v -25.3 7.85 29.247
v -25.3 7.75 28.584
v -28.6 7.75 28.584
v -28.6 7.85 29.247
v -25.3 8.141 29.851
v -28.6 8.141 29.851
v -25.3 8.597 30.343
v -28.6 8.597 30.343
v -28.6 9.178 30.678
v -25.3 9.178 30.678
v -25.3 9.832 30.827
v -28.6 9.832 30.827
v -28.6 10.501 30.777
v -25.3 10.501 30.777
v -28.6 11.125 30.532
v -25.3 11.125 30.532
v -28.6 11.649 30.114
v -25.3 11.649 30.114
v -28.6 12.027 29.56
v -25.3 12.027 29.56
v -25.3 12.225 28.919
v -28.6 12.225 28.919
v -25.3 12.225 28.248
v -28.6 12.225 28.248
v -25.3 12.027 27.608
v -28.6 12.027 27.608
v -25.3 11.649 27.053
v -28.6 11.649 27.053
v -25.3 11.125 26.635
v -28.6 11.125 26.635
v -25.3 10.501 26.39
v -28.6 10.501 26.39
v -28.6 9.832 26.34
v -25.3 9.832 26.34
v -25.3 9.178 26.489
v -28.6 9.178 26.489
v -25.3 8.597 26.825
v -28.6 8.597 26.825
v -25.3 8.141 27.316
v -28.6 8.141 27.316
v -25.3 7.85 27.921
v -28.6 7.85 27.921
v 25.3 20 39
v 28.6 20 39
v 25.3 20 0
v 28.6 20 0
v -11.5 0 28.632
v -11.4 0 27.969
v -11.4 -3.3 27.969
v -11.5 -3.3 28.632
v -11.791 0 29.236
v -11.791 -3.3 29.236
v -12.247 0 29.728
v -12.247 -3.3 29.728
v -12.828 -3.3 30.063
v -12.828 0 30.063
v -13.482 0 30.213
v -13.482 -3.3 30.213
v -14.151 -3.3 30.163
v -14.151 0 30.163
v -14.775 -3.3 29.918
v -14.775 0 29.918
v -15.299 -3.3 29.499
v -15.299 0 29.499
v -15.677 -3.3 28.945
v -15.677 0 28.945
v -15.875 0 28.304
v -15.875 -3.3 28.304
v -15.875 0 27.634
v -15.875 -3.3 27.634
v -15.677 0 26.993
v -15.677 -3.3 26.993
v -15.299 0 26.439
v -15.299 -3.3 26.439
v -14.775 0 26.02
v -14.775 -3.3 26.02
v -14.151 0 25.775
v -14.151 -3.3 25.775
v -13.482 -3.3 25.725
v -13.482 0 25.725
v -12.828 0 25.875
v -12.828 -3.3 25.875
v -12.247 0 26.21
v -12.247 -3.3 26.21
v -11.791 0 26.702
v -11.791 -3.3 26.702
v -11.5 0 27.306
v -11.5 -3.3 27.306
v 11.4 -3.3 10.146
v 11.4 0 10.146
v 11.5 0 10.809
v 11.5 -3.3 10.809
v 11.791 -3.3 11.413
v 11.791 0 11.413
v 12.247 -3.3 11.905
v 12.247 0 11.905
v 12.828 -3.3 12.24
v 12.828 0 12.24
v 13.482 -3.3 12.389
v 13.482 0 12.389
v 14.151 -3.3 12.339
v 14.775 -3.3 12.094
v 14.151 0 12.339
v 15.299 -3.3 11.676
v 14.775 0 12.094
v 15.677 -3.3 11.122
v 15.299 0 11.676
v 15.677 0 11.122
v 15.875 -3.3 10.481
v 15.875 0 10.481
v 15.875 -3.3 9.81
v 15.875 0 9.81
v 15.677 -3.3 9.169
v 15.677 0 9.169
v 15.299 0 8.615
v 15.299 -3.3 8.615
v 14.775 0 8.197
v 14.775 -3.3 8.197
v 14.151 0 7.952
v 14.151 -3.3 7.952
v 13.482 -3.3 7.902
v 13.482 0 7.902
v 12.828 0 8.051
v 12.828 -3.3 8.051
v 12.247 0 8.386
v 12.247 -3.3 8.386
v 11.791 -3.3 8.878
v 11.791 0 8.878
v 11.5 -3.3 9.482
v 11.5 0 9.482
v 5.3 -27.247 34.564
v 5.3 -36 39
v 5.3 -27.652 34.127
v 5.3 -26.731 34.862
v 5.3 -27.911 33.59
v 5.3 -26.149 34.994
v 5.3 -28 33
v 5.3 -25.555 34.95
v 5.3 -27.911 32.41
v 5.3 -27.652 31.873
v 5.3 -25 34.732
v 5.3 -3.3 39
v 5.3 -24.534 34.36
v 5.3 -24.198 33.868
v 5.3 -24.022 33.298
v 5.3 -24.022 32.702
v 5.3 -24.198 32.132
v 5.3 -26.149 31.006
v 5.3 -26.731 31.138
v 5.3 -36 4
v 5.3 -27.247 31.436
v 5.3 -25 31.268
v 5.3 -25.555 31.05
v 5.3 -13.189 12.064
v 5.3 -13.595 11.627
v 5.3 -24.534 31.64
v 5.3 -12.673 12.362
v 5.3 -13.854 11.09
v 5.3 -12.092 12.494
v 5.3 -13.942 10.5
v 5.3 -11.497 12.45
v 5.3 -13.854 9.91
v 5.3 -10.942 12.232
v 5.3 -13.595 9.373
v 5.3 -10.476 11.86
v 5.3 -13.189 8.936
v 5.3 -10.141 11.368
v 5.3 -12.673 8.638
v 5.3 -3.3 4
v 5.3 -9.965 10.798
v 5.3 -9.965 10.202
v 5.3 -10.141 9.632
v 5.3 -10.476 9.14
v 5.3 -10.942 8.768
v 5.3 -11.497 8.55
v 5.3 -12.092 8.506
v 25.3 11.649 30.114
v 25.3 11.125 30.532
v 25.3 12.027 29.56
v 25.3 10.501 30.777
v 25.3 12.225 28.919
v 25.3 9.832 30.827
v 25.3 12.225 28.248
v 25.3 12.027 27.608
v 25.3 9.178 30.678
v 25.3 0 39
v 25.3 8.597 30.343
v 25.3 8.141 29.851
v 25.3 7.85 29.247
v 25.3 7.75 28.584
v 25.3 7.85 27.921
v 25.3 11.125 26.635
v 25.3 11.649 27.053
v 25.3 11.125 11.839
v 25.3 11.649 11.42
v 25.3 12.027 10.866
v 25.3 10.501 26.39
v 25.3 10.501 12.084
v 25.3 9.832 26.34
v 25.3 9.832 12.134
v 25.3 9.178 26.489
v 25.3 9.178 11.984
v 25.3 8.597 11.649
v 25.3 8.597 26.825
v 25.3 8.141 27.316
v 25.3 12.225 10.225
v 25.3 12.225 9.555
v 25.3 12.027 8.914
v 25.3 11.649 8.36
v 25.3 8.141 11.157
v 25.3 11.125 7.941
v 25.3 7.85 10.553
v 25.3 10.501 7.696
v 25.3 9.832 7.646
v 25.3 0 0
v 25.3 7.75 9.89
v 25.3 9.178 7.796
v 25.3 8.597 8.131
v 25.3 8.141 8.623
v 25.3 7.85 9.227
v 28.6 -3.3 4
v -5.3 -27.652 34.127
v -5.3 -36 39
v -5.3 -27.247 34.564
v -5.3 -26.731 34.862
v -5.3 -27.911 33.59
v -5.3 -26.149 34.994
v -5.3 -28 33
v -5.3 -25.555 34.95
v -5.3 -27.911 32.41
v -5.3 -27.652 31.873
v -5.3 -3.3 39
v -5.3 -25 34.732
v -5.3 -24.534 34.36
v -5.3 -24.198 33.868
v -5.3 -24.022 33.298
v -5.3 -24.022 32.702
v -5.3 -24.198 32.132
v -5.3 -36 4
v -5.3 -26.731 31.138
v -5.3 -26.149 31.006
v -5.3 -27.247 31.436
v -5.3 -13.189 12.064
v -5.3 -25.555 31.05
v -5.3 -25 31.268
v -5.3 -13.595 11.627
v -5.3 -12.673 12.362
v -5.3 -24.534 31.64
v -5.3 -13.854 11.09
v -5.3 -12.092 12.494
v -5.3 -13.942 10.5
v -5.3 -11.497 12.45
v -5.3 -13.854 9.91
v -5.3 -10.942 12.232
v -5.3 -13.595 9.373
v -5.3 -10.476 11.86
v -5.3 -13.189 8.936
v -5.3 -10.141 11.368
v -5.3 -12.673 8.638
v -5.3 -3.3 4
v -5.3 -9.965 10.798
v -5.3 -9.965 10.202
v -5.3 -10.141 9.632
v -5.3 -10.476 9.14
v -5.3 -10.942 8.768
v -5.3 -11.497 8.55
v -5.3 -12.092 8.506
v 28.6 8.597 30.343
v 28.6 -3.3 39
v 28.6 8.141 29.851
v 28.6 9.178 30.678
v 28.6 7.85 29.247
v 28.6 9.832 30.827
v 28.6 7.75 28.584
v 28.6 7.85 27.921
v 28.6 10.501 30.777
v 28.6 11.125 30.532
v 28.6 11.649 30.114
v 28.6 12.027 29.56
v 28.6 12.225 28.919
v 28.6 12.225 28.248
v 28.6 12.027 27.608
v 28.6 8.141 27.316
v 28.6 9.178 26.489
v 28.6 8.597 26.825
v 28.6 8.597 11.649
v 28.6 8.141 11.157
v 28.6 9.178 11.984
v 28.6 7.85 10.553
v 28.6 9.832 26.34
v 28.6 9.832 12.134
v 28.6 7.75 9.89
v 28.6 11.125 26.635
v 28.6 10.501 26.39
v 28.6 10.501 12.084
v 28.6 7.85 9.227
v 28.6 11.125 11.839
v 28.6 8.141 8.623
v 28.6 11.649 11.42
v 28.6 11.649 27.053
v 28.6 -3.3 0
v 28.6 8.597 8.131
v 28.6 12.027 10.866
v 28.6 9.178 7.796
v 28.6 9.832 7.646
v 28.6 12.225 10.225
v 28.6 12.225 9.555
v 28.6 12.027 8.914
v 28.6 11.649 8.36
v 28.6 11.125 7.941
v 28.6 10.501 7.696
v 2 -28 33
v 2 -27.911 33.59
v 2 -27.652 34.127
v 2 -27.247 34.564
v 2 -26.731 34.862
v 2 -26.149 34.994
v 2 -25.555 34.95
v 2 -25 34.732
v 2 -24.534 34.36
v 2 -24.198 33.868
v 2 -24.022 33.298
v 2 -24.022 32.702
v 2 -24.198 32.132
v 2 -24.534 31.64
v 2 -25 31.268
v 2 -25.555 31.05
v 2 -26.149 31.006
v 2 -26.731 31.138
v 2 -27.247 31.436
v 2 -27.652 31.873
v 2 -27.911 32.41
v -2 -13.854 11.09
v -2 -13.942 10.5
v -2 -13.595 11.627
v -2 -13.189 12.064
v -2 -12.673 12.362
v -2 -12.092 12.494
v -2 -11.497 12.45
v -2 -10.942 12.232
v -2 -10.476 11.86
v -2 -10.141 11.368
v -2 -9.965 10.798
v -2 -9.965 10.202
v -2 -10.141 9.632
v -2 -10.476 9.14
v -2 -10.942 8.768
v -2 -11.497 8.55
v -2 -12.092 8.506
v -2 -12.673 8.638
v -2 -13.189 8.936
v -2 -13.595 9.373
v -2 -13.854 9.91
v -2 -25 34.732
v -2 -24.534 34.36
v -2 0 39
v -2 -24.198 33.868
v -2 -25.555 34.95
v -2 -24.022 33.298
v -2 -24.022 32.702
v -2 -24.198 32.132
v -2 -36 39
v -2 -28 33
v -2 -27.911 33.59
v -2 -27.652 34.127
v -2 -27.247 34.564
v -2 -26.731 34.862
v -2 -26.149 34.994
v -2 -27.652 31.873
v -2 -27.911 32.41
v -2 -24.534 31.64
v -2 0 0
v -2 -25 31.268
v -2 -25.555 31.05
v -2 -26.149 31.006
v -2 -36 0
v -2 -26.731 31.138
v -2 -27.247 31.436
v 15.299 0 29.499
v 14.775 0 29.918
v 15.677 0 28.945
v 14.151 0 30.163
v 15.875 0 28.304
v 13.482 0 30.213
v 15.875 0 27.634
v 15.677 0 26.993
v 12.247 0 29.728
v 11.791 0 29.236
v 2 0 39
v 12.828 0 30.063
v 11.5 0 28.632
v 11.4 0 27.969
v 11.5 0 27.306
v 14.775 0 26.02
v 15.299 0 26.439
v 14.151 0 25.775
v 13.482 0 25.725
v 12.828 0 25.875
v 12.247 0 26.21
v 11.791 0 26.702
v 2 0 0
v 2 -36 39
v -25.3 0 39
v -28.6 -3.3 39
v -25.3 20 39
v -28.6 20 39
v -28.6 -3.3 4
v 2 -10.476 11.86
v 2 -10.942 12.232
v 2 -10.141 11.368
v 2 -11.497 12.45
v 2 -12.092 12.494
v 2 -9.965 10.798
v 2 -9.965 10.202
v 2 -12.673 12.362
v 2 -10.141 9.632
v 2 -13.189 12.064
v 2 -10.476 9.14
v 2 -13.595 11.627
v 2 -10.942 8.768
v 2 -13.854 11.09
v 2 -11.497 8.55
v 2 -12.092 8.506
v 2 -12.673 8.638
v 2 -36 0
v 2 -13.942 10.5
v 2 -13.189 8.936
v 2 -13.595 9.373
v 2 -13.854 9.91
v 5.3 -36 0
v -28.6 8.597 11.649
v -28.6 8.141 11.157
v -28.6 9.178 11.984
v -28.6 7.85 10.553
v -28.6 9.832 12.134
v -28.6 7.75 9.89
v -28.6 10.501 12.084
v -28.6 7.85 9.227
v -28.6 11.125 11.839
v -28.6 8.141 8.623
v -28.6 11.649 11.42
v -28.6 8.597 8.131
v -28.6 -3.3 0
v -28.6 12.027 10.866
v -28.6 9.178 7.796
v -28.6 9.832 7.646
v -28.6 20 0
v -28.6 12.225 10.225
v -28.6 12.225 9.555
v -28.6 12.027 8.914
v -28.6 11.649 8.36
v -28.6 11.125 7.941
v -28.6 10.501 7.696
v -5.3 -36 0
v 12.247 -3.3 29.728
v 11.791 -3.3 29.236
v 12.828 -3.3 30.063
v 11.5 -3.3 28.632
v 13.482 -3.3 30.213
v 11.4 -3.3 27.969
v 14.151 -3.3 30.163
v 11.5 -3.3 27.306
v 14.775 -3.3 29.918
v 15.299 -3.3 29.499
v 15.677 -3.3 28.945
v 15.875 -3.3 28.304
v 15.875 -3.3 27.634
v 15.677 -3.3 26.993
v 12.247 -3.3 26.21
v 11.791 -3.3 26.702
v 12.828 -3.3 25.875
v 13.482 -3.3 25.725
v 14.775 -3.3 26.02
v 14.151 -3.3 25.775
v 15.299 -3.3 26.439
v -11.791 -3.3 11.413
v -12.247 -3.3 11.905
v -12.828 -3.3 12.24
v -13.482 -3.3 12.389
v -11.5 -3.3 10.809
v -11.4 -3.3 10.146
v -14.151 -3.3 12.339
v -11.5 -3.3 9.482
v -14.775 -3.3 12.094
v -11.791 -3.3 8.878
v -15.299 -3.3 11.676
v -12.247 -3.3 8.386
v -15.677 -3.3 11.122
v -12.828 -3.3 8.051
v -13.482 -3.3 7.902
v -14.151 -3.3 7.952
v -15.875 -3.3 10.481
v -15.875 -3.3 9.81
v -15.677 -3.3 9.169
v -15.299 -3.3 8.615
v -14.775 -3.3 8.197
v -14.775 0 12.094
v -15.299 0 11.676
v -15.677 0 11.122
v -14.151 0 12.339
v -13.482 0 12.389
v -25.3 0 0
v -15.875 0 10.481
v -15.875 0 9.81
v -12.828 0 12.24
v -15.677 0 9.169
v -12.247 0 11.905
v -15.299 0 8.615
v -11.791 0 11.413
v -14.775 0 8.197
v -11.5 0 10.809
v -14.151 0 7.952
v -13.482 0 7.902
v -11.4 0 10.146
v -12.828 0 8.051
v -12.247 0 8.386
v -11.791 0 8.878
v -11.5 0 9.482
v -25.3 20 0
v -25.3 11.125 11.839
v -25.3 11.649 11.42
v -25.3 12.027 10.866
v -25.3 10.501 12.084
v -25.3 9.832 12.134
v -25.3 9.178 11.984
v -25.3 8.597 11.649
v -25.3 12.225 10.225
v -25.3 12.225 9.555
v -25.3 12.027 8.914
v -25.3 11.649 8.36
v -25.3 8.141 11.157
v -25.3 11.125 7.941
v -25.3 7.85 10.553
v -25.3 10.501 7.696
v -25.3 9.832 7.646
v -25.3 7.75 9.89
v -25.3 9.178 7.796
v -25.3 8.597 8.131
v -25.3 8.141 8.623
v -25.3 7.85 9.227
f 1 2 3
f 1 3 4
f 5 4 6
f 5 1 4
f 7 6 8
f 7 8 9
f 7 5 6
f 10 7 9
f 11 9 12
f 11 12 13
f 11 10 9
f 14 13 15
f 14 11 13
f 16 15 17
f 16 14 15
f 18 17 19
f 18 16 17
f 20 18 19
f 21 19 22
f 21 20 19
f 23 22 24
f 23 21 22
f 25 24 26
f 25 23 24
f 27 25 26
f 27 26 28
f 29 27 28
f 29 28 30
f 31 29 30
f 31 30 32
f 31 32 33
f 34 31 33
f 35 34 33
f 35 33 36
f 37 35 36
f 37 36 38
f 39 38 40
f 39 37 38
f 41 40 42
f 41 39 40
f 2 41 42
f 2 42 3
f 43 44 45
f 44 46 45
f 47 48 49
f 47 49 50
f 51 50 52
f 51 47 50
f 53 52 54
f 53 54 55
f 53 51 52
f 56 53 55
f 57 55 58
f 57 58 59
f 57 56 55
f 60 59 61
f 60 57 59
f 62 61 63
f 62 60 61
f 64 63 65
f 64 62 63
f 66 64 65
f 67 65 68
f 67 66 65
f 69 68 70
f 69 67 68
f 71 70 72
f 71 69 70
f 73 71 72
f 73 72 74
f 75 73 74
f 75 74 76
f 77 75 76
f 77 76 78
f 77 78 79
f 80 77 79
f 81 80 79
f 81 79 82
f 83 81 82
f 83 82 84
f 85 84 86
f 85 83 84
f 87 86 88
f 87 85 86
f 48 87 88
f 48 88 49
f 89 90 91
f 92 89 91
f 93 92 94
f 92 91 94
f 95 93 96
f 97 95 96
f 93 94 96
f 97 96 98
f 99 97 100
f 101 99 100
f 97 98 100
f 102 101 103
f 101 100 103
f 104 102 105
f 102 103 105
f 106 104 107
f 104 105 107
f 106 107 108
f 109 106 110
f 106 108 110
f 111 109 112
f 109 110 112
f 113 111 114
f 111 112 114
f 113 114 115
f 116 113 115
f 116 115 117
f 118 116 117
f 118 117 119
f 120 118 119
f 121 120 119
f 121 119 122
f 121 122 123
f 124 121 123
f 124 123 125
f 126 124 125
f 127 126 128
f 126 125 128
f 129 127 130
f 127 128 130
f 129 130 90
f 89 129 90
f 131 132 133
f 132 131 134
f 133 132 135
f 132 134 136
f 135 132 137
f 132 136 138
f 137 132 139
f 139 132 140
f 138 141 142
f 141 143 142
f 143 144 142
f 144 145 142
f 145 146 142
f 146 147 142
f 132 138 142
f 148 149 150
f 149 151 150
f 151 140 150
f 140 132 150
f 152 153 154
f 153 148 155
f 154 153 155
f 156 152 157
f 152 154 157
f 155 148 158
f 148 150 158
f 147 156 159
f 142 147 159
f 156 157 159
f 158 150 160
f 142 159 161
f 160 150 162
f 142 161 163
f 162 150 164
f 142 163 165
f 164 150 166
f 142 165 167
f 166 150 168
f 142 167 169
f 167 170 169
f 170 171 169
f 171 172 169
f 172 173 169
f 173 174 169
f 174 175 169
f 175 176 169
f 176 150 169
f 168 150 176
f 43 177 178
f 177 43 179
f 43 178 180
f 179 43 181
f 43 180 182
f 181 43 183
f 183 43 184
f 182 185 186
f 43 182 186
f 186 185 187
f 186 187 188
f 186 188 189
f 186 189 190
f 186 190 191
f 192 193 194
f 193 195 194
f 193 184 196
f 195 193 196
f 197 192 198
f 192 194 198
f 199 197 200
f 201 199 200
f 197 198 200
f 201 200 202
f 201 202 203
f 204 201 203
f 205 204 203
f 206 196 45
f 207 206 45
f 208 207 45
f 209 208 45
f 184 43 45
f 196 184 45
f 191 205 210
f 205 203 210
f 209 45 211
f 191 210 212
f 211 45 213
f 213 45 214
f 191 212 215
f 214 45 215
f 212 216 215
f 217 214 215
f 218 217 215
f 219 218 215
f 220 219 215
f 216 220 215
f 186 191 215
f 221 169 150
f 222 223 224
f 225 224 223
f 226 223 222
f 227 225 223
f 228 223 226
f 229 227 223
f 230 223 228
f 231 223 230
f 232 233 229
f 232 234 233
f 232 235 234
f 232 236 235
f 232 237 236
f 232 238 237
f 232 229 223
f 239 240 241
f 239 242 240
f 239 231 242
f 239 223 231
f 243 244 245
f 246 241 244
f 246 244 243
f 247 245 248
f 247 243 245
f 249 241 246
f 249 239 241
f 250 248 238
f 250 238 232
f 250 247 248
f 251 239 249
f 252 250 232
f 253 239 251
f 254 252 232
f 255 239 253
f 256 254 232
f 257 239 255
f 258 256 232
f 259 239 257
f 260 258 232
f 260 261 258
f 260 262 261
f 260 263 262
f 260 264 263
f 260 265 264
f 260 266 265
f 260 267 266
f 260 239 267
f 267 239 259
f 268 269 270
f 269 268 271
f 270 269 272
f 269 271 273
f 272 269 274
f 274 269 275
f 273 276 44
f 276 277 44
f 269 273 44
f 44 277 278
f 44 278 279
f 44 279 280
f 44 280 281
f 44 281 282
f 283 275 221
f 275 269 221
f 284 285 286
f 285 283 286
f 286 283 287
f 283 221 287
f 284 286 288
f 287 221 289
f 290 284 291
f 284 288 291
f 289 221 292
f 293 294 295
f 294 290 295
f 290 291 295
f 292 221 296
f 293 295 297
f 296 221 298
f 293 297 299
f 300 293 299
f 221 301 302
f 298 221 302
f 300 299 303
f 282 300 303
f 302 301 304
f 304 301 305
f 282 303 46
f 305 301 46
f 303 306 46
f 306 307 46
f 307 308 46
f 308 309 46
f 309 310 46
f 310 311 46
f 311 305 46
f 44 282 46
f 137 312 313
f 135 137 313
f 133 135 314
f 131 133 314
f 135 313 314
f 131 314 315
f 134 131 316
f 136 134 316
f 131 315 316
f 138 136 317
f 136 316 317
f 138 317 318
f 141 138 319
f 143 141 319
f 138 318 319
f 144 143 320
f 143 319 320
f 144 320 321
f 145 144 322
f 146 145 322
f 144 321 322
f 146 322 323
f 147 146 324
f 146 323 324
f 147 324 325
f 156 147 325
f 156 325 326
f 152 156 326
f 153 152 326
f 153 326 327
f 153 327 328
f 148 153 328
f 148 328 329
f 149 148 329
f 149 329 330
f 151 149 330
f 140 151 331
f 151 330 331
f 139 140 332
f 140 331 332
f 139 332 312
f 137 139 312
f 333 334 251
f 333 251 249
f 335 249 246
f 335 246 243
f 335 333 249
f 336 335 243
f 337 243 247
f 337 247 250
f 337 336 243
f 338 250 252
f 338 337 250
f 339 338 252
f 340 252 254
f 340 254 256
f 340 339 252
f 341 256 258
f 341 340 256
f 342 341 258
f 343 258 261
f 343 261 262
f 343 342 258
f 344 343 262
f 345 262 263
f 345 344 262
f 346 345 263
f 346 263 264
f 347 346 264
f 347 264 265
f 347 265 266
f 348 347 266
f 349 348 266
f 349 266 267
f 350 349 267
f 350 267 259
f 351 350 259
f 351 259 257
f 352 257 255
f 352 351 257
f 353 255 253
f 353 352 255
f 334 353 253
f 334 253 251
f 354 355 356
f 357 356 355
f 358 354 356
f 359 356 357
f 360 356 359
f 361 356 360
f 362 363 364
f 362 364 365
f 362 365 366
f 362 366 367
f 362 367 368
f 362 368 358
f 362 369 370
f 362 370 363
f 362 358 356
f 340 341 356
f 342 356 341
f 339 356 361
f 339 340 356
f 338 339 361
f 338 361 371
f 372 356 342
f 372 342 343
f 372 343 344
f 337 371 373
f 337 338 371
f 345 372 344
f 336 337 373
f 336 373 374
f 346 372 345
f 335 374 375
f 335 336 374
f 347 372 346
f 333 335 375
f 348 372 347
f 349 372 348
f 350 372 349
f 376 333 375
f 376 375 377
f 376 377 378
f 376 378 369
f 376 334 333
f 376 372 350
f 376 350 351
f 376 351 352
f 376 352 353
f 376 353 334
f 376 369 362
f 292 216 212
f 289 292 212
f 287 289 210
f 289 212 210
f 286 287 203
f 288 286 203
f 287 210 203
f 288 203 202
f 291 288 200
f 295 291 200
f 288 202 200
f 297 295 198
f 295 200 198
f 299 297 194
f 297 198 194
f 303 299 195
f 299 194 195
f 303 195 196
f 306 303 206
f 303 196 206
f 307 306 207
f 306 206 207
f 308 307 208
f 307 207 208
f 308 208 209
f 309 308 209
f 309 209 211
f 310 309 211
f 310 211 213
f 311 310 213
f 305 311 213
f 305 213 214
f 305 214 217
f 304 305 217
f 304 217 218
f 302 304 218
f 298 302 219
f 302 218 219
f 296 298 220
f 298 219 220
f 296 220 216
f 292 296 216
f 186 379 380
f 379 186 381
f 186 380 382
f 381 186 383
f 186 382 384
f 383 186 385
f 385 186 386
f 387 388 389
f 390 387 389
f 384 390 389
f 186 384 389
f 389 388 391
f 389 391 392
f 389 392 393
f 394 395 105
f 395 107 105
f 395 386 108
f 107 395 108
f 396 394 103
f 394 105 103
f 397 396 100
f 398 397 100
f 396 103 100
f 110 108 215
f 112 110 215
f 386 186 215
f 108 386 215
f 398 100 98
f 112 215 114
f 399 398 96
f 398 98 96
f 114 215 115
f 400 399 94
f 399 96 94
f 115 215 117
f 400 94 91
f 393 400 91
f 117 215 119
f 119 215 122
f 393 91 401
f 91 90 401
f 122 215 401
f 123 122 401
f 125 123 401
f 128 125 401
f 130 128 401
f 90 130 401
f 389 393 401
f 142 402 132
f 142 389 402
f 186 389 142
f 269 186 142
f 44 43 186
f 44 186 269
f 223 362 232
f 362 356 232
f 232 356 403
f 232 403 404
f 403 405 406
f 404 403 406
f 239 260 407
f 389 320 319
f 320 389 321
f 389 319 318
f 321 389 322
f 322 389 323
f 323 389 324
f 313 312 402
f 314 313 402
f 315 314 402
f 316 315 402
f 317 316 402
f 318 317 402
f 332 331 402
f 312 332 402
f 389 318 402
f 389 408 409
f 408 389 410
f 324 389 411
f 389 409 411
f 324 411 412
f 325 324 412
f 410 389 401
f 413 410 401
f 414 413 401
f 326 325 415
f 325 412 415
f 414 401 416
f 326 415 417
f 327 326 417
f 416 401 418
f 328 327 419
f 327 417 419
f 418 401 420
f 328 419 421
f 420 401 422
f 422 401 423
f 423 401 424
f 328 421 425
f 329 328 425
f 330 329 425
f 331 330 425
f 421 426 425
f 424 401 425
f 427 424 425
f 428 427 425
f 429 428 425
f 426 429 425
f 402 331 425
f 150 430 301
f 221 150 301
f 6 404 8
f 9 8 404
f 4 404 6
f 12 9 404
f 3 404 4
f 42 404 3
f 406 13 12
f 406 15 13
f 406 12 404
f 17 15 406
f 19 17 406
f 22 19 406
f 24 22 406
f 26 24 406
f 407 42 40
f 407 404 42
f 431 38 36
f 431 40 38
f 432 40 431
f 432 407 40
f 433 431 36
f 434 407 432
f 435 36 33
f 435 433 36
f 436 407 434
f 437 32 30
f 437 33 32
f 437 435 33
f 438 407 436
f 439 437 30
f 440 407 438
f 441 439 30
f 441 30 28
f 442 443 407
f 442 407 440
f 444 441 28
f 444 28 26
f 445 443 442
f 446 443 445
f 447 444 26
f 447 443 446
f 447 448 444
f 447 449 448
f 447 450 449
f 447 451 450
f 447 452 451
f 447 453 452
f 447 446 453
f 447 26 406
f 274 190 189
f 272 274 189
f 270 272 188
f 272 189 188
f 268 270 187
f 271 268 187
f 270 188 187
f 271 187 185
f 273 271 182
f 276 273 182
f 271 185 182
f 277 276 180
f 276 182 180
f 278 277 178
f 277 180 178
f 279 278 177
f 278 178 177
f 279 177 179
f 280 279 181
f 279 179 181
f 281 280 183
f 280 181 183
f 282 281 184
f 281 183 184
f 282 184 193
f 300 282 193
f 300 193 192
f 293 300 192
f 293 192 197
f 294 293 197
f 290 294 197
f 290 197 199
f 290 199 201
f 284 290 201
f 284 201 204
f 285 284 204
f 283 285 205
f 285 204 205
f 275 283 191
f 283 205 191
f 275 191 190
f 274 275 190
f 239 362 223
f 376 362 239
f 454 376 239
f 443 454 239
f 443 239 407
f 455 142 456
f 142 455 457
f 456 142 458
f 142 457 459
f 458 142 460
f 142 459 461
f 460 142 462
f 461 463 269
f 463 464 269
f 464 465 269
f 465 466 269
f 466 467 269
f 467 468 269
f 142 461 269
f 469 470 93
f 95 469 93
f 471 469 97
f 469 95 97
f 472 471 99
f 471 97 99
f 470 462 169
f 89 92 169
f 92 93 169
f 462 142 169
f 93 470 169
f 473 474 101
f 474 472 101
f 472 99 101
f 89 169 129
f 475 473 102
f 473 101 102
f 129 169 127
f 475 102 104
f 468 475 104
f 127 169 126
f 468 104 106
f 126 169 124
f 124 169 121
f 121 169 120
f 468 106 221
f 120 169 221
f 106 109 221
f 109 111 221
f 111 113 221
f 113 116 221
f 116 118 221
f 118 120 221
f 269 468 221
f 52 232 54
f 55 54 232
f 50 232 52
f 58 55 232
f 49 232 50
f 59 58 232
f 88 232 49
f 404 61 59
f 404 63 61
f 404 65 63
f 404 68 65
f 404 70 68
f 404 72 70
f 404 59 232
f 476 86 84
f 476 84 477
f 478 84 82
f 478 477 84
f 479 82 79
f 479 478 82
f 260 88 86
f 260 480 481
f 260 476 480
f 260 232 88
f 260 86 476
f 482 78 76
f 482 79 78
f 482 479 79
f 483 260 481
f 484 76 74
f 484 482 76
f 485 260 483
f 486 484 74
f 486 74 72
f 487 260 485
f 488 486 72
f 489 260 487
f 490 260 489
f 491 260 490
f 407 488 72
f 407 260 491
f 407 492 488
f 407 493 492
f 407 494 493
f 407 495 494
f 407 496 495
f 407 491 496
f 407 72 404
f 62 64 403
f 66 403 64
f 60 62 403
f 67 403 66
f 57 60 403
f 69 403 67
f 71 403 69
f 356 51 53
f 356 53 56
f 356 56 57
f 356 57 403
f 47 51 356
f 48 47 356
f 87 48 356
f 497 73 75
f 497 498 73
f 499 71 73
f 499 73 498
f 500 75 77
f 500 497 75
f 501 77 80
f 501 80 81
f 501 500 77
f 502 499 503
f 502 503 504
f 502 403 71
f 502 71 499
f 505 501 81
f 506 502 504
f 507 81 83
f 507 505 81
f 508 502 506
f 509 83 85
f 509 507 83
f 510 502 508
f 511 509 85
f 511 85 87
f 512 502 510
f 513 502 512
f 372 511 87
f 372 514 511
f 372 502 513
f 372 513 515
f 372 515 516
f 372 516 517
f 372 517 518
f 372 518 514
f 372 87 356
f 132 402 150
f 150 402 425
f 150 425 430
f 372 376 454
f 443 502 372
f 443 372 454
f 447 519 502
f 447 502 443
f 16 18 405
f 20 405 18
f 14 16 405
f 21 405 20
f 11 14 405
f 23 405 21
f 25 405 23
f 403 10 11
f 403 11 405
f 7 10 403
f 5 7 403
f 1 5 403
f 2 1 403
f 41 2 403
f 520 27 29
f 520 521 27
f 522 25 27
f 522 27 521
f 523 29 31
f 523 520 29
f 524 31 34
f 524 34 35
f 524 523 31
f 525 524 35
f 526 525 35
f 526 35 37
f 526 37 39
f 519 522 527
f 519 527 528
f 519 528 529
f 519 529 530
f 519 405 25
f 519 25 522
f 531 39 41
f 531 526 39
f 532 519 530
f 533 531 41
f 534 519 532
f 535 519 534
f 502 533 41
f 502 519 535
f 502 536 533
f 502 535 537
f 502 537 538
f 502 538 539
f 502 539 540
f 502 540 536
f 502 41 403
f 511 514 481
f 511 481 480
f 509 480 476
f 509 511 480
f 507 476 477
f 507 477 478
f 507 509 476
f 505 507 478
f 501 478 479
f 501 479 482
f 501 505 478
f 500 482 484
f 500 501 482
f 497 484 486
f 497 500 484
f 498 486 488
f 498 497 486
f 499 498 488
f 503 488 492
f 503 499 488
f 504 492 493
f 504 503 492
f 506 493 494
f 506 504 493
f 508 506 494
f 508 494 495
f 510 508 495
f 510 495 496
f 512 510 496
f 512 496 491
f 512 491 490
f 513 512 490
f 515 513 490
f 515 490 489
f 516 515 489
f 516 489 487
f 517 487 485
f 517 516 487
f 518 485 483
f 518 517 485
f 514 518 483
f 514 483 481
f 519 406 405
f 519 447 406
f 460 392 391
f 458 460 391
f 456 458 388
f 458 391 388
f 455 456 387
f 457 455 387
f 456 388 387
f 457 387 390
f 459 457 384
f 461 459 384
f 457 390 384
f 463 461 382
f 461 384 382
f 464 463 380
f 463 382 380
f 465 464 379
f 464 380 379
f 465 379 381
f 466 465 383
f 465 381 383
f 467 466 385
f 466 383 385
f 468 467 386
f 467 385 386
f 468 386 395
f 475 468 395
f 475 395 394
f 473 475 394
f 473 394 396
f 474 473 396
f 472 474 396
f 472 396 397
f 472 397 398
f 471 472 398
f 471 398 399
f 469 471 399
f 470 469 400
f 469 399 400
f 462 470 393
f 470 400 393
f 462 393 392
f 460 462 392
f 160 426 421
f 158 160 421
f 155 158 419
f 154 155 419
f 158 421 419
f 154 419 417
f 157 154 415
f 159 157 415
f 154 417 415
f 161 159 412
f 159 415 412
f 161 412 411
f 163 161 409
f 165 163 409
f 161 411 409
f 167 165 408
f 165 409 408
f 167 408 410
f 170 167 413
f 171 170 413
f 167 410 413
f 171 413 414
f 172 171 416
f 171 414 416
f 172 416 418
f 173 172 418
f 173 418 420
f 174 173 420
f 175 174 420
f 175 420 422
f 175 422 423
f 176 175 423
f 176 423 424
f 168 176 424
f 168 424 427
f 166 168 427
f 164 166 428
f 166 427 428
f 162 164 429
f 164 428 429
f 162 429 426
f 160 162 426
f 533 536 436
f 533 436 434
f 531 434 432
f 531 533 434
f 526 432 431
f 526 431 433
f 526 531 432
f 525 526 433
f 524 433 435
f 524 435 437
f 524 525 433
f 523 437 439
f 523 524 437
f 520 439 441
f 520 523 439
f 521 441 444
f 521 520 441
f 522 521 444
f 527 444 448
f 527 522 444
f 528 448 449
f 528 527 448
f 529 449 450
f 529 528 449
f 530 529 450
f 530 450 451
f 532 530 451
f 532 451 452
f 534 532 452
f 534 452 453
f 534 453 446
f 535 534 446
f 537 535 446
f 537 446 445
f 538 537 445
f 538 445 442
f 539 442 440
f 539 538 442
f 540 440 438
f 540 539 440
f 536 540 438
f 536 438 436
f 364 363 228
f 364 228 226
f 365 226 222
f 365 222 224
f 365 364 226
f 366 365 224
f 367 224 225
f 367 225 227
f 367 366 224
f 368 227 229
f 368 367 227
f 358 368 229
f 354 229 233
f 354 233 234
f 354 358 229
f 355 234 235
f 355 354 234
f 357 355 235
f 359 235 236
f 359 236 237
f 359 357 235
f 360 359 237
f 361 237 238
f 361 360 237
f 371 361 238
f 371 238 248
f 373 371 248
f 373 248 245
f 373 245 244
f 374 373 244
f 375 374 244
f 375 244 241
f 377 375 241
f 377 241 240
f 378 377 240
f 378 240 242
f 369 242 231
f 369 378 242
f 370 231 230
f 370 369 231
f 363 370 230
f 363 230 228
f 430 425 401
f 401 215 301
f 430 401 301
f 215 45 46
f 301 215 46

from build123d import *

# Parameters (mm, degrees)
F1_DEPTH = 4
F3_DEPTH = 35
F4_R     = 2.25
F5_DEPTH = 3.3
F6_R     = 2
F7_DEPTH = 3.3
F8_R     = 2.25
F9_DEPTH = 3.3


with BuildPart() as f1:
    # F0 (on Top) → F1 (new body)
    with BuildSketch(Plane.XY):
        Polygon((2, -36), (5.3, -36), (28.6, -3.3), (28.6, 0), (28.6, 20), (25.3, 20), (25.3, 0), (2, 0), align=None)
    extrude(amount=F1_DEPTH)

    # F2 (on face) → F3 (join)
    with BuildSketch(Plane.XY.offset(4)):
        Polygon((2, -36), (5.3, -36), (5.3, -3.3), (28.6, -3.3), (28.6, 20), (25.3, 20), (25.3, 0), (2, 0), align=None)
    extrude(amount=F3_DEPTH)

    # F4 (on face) → F5 (cut, through all)
    with BuildSketch(Plane(origin=(25.3, 0, 0), x_dir=(0, -1, 0), z_dir=(-1, 0, 0))):
        with Locations((-10, 28.5837799311)):
            Circle(F4_R)
        with Locations((-10, 9.8900189623)):
            Circle(F4_R)
    extrude(amount=-F5_DEPTH, mode=Mode.SUBTRACT)

    # F6 (on face) → F7 (cut, through all)
    with BuildSketch(Plane(origin=(2, 0, 0), x_dir=(0, -1, 0), z_dir=(-1, 0, 0))):
        with Locations((26, 33)):
            Circle(F6_R)
        with Locations((11.9424867444, 10.5)):
            Circle(F6_R)
    extrude(amount=-F7_DEPTH, mode=Mode.SUBTRACT)

    # F8 (on face) → F9 (cut, through all)
    with BuildSketch(Plane(origin=(0, 0, 0), x_dir=(-1, 0, 0), z_dir=(0, 1, 0))):
        with Locations((-13.65, 27.9689840972)):
            Circle(F8_R)
        with Locations((-13.65, 10.1455412805)):
            Circle(F8_R)
    extrude(amount=-F9_DEPTH, mode=Mode.SUBTRACT)


with BuildPart() as f10_1:
    # F10: instance of F1
    add(f1.part.mirror(Plane.YZ))


solid = Compound([f1.part, f10_1.part])
